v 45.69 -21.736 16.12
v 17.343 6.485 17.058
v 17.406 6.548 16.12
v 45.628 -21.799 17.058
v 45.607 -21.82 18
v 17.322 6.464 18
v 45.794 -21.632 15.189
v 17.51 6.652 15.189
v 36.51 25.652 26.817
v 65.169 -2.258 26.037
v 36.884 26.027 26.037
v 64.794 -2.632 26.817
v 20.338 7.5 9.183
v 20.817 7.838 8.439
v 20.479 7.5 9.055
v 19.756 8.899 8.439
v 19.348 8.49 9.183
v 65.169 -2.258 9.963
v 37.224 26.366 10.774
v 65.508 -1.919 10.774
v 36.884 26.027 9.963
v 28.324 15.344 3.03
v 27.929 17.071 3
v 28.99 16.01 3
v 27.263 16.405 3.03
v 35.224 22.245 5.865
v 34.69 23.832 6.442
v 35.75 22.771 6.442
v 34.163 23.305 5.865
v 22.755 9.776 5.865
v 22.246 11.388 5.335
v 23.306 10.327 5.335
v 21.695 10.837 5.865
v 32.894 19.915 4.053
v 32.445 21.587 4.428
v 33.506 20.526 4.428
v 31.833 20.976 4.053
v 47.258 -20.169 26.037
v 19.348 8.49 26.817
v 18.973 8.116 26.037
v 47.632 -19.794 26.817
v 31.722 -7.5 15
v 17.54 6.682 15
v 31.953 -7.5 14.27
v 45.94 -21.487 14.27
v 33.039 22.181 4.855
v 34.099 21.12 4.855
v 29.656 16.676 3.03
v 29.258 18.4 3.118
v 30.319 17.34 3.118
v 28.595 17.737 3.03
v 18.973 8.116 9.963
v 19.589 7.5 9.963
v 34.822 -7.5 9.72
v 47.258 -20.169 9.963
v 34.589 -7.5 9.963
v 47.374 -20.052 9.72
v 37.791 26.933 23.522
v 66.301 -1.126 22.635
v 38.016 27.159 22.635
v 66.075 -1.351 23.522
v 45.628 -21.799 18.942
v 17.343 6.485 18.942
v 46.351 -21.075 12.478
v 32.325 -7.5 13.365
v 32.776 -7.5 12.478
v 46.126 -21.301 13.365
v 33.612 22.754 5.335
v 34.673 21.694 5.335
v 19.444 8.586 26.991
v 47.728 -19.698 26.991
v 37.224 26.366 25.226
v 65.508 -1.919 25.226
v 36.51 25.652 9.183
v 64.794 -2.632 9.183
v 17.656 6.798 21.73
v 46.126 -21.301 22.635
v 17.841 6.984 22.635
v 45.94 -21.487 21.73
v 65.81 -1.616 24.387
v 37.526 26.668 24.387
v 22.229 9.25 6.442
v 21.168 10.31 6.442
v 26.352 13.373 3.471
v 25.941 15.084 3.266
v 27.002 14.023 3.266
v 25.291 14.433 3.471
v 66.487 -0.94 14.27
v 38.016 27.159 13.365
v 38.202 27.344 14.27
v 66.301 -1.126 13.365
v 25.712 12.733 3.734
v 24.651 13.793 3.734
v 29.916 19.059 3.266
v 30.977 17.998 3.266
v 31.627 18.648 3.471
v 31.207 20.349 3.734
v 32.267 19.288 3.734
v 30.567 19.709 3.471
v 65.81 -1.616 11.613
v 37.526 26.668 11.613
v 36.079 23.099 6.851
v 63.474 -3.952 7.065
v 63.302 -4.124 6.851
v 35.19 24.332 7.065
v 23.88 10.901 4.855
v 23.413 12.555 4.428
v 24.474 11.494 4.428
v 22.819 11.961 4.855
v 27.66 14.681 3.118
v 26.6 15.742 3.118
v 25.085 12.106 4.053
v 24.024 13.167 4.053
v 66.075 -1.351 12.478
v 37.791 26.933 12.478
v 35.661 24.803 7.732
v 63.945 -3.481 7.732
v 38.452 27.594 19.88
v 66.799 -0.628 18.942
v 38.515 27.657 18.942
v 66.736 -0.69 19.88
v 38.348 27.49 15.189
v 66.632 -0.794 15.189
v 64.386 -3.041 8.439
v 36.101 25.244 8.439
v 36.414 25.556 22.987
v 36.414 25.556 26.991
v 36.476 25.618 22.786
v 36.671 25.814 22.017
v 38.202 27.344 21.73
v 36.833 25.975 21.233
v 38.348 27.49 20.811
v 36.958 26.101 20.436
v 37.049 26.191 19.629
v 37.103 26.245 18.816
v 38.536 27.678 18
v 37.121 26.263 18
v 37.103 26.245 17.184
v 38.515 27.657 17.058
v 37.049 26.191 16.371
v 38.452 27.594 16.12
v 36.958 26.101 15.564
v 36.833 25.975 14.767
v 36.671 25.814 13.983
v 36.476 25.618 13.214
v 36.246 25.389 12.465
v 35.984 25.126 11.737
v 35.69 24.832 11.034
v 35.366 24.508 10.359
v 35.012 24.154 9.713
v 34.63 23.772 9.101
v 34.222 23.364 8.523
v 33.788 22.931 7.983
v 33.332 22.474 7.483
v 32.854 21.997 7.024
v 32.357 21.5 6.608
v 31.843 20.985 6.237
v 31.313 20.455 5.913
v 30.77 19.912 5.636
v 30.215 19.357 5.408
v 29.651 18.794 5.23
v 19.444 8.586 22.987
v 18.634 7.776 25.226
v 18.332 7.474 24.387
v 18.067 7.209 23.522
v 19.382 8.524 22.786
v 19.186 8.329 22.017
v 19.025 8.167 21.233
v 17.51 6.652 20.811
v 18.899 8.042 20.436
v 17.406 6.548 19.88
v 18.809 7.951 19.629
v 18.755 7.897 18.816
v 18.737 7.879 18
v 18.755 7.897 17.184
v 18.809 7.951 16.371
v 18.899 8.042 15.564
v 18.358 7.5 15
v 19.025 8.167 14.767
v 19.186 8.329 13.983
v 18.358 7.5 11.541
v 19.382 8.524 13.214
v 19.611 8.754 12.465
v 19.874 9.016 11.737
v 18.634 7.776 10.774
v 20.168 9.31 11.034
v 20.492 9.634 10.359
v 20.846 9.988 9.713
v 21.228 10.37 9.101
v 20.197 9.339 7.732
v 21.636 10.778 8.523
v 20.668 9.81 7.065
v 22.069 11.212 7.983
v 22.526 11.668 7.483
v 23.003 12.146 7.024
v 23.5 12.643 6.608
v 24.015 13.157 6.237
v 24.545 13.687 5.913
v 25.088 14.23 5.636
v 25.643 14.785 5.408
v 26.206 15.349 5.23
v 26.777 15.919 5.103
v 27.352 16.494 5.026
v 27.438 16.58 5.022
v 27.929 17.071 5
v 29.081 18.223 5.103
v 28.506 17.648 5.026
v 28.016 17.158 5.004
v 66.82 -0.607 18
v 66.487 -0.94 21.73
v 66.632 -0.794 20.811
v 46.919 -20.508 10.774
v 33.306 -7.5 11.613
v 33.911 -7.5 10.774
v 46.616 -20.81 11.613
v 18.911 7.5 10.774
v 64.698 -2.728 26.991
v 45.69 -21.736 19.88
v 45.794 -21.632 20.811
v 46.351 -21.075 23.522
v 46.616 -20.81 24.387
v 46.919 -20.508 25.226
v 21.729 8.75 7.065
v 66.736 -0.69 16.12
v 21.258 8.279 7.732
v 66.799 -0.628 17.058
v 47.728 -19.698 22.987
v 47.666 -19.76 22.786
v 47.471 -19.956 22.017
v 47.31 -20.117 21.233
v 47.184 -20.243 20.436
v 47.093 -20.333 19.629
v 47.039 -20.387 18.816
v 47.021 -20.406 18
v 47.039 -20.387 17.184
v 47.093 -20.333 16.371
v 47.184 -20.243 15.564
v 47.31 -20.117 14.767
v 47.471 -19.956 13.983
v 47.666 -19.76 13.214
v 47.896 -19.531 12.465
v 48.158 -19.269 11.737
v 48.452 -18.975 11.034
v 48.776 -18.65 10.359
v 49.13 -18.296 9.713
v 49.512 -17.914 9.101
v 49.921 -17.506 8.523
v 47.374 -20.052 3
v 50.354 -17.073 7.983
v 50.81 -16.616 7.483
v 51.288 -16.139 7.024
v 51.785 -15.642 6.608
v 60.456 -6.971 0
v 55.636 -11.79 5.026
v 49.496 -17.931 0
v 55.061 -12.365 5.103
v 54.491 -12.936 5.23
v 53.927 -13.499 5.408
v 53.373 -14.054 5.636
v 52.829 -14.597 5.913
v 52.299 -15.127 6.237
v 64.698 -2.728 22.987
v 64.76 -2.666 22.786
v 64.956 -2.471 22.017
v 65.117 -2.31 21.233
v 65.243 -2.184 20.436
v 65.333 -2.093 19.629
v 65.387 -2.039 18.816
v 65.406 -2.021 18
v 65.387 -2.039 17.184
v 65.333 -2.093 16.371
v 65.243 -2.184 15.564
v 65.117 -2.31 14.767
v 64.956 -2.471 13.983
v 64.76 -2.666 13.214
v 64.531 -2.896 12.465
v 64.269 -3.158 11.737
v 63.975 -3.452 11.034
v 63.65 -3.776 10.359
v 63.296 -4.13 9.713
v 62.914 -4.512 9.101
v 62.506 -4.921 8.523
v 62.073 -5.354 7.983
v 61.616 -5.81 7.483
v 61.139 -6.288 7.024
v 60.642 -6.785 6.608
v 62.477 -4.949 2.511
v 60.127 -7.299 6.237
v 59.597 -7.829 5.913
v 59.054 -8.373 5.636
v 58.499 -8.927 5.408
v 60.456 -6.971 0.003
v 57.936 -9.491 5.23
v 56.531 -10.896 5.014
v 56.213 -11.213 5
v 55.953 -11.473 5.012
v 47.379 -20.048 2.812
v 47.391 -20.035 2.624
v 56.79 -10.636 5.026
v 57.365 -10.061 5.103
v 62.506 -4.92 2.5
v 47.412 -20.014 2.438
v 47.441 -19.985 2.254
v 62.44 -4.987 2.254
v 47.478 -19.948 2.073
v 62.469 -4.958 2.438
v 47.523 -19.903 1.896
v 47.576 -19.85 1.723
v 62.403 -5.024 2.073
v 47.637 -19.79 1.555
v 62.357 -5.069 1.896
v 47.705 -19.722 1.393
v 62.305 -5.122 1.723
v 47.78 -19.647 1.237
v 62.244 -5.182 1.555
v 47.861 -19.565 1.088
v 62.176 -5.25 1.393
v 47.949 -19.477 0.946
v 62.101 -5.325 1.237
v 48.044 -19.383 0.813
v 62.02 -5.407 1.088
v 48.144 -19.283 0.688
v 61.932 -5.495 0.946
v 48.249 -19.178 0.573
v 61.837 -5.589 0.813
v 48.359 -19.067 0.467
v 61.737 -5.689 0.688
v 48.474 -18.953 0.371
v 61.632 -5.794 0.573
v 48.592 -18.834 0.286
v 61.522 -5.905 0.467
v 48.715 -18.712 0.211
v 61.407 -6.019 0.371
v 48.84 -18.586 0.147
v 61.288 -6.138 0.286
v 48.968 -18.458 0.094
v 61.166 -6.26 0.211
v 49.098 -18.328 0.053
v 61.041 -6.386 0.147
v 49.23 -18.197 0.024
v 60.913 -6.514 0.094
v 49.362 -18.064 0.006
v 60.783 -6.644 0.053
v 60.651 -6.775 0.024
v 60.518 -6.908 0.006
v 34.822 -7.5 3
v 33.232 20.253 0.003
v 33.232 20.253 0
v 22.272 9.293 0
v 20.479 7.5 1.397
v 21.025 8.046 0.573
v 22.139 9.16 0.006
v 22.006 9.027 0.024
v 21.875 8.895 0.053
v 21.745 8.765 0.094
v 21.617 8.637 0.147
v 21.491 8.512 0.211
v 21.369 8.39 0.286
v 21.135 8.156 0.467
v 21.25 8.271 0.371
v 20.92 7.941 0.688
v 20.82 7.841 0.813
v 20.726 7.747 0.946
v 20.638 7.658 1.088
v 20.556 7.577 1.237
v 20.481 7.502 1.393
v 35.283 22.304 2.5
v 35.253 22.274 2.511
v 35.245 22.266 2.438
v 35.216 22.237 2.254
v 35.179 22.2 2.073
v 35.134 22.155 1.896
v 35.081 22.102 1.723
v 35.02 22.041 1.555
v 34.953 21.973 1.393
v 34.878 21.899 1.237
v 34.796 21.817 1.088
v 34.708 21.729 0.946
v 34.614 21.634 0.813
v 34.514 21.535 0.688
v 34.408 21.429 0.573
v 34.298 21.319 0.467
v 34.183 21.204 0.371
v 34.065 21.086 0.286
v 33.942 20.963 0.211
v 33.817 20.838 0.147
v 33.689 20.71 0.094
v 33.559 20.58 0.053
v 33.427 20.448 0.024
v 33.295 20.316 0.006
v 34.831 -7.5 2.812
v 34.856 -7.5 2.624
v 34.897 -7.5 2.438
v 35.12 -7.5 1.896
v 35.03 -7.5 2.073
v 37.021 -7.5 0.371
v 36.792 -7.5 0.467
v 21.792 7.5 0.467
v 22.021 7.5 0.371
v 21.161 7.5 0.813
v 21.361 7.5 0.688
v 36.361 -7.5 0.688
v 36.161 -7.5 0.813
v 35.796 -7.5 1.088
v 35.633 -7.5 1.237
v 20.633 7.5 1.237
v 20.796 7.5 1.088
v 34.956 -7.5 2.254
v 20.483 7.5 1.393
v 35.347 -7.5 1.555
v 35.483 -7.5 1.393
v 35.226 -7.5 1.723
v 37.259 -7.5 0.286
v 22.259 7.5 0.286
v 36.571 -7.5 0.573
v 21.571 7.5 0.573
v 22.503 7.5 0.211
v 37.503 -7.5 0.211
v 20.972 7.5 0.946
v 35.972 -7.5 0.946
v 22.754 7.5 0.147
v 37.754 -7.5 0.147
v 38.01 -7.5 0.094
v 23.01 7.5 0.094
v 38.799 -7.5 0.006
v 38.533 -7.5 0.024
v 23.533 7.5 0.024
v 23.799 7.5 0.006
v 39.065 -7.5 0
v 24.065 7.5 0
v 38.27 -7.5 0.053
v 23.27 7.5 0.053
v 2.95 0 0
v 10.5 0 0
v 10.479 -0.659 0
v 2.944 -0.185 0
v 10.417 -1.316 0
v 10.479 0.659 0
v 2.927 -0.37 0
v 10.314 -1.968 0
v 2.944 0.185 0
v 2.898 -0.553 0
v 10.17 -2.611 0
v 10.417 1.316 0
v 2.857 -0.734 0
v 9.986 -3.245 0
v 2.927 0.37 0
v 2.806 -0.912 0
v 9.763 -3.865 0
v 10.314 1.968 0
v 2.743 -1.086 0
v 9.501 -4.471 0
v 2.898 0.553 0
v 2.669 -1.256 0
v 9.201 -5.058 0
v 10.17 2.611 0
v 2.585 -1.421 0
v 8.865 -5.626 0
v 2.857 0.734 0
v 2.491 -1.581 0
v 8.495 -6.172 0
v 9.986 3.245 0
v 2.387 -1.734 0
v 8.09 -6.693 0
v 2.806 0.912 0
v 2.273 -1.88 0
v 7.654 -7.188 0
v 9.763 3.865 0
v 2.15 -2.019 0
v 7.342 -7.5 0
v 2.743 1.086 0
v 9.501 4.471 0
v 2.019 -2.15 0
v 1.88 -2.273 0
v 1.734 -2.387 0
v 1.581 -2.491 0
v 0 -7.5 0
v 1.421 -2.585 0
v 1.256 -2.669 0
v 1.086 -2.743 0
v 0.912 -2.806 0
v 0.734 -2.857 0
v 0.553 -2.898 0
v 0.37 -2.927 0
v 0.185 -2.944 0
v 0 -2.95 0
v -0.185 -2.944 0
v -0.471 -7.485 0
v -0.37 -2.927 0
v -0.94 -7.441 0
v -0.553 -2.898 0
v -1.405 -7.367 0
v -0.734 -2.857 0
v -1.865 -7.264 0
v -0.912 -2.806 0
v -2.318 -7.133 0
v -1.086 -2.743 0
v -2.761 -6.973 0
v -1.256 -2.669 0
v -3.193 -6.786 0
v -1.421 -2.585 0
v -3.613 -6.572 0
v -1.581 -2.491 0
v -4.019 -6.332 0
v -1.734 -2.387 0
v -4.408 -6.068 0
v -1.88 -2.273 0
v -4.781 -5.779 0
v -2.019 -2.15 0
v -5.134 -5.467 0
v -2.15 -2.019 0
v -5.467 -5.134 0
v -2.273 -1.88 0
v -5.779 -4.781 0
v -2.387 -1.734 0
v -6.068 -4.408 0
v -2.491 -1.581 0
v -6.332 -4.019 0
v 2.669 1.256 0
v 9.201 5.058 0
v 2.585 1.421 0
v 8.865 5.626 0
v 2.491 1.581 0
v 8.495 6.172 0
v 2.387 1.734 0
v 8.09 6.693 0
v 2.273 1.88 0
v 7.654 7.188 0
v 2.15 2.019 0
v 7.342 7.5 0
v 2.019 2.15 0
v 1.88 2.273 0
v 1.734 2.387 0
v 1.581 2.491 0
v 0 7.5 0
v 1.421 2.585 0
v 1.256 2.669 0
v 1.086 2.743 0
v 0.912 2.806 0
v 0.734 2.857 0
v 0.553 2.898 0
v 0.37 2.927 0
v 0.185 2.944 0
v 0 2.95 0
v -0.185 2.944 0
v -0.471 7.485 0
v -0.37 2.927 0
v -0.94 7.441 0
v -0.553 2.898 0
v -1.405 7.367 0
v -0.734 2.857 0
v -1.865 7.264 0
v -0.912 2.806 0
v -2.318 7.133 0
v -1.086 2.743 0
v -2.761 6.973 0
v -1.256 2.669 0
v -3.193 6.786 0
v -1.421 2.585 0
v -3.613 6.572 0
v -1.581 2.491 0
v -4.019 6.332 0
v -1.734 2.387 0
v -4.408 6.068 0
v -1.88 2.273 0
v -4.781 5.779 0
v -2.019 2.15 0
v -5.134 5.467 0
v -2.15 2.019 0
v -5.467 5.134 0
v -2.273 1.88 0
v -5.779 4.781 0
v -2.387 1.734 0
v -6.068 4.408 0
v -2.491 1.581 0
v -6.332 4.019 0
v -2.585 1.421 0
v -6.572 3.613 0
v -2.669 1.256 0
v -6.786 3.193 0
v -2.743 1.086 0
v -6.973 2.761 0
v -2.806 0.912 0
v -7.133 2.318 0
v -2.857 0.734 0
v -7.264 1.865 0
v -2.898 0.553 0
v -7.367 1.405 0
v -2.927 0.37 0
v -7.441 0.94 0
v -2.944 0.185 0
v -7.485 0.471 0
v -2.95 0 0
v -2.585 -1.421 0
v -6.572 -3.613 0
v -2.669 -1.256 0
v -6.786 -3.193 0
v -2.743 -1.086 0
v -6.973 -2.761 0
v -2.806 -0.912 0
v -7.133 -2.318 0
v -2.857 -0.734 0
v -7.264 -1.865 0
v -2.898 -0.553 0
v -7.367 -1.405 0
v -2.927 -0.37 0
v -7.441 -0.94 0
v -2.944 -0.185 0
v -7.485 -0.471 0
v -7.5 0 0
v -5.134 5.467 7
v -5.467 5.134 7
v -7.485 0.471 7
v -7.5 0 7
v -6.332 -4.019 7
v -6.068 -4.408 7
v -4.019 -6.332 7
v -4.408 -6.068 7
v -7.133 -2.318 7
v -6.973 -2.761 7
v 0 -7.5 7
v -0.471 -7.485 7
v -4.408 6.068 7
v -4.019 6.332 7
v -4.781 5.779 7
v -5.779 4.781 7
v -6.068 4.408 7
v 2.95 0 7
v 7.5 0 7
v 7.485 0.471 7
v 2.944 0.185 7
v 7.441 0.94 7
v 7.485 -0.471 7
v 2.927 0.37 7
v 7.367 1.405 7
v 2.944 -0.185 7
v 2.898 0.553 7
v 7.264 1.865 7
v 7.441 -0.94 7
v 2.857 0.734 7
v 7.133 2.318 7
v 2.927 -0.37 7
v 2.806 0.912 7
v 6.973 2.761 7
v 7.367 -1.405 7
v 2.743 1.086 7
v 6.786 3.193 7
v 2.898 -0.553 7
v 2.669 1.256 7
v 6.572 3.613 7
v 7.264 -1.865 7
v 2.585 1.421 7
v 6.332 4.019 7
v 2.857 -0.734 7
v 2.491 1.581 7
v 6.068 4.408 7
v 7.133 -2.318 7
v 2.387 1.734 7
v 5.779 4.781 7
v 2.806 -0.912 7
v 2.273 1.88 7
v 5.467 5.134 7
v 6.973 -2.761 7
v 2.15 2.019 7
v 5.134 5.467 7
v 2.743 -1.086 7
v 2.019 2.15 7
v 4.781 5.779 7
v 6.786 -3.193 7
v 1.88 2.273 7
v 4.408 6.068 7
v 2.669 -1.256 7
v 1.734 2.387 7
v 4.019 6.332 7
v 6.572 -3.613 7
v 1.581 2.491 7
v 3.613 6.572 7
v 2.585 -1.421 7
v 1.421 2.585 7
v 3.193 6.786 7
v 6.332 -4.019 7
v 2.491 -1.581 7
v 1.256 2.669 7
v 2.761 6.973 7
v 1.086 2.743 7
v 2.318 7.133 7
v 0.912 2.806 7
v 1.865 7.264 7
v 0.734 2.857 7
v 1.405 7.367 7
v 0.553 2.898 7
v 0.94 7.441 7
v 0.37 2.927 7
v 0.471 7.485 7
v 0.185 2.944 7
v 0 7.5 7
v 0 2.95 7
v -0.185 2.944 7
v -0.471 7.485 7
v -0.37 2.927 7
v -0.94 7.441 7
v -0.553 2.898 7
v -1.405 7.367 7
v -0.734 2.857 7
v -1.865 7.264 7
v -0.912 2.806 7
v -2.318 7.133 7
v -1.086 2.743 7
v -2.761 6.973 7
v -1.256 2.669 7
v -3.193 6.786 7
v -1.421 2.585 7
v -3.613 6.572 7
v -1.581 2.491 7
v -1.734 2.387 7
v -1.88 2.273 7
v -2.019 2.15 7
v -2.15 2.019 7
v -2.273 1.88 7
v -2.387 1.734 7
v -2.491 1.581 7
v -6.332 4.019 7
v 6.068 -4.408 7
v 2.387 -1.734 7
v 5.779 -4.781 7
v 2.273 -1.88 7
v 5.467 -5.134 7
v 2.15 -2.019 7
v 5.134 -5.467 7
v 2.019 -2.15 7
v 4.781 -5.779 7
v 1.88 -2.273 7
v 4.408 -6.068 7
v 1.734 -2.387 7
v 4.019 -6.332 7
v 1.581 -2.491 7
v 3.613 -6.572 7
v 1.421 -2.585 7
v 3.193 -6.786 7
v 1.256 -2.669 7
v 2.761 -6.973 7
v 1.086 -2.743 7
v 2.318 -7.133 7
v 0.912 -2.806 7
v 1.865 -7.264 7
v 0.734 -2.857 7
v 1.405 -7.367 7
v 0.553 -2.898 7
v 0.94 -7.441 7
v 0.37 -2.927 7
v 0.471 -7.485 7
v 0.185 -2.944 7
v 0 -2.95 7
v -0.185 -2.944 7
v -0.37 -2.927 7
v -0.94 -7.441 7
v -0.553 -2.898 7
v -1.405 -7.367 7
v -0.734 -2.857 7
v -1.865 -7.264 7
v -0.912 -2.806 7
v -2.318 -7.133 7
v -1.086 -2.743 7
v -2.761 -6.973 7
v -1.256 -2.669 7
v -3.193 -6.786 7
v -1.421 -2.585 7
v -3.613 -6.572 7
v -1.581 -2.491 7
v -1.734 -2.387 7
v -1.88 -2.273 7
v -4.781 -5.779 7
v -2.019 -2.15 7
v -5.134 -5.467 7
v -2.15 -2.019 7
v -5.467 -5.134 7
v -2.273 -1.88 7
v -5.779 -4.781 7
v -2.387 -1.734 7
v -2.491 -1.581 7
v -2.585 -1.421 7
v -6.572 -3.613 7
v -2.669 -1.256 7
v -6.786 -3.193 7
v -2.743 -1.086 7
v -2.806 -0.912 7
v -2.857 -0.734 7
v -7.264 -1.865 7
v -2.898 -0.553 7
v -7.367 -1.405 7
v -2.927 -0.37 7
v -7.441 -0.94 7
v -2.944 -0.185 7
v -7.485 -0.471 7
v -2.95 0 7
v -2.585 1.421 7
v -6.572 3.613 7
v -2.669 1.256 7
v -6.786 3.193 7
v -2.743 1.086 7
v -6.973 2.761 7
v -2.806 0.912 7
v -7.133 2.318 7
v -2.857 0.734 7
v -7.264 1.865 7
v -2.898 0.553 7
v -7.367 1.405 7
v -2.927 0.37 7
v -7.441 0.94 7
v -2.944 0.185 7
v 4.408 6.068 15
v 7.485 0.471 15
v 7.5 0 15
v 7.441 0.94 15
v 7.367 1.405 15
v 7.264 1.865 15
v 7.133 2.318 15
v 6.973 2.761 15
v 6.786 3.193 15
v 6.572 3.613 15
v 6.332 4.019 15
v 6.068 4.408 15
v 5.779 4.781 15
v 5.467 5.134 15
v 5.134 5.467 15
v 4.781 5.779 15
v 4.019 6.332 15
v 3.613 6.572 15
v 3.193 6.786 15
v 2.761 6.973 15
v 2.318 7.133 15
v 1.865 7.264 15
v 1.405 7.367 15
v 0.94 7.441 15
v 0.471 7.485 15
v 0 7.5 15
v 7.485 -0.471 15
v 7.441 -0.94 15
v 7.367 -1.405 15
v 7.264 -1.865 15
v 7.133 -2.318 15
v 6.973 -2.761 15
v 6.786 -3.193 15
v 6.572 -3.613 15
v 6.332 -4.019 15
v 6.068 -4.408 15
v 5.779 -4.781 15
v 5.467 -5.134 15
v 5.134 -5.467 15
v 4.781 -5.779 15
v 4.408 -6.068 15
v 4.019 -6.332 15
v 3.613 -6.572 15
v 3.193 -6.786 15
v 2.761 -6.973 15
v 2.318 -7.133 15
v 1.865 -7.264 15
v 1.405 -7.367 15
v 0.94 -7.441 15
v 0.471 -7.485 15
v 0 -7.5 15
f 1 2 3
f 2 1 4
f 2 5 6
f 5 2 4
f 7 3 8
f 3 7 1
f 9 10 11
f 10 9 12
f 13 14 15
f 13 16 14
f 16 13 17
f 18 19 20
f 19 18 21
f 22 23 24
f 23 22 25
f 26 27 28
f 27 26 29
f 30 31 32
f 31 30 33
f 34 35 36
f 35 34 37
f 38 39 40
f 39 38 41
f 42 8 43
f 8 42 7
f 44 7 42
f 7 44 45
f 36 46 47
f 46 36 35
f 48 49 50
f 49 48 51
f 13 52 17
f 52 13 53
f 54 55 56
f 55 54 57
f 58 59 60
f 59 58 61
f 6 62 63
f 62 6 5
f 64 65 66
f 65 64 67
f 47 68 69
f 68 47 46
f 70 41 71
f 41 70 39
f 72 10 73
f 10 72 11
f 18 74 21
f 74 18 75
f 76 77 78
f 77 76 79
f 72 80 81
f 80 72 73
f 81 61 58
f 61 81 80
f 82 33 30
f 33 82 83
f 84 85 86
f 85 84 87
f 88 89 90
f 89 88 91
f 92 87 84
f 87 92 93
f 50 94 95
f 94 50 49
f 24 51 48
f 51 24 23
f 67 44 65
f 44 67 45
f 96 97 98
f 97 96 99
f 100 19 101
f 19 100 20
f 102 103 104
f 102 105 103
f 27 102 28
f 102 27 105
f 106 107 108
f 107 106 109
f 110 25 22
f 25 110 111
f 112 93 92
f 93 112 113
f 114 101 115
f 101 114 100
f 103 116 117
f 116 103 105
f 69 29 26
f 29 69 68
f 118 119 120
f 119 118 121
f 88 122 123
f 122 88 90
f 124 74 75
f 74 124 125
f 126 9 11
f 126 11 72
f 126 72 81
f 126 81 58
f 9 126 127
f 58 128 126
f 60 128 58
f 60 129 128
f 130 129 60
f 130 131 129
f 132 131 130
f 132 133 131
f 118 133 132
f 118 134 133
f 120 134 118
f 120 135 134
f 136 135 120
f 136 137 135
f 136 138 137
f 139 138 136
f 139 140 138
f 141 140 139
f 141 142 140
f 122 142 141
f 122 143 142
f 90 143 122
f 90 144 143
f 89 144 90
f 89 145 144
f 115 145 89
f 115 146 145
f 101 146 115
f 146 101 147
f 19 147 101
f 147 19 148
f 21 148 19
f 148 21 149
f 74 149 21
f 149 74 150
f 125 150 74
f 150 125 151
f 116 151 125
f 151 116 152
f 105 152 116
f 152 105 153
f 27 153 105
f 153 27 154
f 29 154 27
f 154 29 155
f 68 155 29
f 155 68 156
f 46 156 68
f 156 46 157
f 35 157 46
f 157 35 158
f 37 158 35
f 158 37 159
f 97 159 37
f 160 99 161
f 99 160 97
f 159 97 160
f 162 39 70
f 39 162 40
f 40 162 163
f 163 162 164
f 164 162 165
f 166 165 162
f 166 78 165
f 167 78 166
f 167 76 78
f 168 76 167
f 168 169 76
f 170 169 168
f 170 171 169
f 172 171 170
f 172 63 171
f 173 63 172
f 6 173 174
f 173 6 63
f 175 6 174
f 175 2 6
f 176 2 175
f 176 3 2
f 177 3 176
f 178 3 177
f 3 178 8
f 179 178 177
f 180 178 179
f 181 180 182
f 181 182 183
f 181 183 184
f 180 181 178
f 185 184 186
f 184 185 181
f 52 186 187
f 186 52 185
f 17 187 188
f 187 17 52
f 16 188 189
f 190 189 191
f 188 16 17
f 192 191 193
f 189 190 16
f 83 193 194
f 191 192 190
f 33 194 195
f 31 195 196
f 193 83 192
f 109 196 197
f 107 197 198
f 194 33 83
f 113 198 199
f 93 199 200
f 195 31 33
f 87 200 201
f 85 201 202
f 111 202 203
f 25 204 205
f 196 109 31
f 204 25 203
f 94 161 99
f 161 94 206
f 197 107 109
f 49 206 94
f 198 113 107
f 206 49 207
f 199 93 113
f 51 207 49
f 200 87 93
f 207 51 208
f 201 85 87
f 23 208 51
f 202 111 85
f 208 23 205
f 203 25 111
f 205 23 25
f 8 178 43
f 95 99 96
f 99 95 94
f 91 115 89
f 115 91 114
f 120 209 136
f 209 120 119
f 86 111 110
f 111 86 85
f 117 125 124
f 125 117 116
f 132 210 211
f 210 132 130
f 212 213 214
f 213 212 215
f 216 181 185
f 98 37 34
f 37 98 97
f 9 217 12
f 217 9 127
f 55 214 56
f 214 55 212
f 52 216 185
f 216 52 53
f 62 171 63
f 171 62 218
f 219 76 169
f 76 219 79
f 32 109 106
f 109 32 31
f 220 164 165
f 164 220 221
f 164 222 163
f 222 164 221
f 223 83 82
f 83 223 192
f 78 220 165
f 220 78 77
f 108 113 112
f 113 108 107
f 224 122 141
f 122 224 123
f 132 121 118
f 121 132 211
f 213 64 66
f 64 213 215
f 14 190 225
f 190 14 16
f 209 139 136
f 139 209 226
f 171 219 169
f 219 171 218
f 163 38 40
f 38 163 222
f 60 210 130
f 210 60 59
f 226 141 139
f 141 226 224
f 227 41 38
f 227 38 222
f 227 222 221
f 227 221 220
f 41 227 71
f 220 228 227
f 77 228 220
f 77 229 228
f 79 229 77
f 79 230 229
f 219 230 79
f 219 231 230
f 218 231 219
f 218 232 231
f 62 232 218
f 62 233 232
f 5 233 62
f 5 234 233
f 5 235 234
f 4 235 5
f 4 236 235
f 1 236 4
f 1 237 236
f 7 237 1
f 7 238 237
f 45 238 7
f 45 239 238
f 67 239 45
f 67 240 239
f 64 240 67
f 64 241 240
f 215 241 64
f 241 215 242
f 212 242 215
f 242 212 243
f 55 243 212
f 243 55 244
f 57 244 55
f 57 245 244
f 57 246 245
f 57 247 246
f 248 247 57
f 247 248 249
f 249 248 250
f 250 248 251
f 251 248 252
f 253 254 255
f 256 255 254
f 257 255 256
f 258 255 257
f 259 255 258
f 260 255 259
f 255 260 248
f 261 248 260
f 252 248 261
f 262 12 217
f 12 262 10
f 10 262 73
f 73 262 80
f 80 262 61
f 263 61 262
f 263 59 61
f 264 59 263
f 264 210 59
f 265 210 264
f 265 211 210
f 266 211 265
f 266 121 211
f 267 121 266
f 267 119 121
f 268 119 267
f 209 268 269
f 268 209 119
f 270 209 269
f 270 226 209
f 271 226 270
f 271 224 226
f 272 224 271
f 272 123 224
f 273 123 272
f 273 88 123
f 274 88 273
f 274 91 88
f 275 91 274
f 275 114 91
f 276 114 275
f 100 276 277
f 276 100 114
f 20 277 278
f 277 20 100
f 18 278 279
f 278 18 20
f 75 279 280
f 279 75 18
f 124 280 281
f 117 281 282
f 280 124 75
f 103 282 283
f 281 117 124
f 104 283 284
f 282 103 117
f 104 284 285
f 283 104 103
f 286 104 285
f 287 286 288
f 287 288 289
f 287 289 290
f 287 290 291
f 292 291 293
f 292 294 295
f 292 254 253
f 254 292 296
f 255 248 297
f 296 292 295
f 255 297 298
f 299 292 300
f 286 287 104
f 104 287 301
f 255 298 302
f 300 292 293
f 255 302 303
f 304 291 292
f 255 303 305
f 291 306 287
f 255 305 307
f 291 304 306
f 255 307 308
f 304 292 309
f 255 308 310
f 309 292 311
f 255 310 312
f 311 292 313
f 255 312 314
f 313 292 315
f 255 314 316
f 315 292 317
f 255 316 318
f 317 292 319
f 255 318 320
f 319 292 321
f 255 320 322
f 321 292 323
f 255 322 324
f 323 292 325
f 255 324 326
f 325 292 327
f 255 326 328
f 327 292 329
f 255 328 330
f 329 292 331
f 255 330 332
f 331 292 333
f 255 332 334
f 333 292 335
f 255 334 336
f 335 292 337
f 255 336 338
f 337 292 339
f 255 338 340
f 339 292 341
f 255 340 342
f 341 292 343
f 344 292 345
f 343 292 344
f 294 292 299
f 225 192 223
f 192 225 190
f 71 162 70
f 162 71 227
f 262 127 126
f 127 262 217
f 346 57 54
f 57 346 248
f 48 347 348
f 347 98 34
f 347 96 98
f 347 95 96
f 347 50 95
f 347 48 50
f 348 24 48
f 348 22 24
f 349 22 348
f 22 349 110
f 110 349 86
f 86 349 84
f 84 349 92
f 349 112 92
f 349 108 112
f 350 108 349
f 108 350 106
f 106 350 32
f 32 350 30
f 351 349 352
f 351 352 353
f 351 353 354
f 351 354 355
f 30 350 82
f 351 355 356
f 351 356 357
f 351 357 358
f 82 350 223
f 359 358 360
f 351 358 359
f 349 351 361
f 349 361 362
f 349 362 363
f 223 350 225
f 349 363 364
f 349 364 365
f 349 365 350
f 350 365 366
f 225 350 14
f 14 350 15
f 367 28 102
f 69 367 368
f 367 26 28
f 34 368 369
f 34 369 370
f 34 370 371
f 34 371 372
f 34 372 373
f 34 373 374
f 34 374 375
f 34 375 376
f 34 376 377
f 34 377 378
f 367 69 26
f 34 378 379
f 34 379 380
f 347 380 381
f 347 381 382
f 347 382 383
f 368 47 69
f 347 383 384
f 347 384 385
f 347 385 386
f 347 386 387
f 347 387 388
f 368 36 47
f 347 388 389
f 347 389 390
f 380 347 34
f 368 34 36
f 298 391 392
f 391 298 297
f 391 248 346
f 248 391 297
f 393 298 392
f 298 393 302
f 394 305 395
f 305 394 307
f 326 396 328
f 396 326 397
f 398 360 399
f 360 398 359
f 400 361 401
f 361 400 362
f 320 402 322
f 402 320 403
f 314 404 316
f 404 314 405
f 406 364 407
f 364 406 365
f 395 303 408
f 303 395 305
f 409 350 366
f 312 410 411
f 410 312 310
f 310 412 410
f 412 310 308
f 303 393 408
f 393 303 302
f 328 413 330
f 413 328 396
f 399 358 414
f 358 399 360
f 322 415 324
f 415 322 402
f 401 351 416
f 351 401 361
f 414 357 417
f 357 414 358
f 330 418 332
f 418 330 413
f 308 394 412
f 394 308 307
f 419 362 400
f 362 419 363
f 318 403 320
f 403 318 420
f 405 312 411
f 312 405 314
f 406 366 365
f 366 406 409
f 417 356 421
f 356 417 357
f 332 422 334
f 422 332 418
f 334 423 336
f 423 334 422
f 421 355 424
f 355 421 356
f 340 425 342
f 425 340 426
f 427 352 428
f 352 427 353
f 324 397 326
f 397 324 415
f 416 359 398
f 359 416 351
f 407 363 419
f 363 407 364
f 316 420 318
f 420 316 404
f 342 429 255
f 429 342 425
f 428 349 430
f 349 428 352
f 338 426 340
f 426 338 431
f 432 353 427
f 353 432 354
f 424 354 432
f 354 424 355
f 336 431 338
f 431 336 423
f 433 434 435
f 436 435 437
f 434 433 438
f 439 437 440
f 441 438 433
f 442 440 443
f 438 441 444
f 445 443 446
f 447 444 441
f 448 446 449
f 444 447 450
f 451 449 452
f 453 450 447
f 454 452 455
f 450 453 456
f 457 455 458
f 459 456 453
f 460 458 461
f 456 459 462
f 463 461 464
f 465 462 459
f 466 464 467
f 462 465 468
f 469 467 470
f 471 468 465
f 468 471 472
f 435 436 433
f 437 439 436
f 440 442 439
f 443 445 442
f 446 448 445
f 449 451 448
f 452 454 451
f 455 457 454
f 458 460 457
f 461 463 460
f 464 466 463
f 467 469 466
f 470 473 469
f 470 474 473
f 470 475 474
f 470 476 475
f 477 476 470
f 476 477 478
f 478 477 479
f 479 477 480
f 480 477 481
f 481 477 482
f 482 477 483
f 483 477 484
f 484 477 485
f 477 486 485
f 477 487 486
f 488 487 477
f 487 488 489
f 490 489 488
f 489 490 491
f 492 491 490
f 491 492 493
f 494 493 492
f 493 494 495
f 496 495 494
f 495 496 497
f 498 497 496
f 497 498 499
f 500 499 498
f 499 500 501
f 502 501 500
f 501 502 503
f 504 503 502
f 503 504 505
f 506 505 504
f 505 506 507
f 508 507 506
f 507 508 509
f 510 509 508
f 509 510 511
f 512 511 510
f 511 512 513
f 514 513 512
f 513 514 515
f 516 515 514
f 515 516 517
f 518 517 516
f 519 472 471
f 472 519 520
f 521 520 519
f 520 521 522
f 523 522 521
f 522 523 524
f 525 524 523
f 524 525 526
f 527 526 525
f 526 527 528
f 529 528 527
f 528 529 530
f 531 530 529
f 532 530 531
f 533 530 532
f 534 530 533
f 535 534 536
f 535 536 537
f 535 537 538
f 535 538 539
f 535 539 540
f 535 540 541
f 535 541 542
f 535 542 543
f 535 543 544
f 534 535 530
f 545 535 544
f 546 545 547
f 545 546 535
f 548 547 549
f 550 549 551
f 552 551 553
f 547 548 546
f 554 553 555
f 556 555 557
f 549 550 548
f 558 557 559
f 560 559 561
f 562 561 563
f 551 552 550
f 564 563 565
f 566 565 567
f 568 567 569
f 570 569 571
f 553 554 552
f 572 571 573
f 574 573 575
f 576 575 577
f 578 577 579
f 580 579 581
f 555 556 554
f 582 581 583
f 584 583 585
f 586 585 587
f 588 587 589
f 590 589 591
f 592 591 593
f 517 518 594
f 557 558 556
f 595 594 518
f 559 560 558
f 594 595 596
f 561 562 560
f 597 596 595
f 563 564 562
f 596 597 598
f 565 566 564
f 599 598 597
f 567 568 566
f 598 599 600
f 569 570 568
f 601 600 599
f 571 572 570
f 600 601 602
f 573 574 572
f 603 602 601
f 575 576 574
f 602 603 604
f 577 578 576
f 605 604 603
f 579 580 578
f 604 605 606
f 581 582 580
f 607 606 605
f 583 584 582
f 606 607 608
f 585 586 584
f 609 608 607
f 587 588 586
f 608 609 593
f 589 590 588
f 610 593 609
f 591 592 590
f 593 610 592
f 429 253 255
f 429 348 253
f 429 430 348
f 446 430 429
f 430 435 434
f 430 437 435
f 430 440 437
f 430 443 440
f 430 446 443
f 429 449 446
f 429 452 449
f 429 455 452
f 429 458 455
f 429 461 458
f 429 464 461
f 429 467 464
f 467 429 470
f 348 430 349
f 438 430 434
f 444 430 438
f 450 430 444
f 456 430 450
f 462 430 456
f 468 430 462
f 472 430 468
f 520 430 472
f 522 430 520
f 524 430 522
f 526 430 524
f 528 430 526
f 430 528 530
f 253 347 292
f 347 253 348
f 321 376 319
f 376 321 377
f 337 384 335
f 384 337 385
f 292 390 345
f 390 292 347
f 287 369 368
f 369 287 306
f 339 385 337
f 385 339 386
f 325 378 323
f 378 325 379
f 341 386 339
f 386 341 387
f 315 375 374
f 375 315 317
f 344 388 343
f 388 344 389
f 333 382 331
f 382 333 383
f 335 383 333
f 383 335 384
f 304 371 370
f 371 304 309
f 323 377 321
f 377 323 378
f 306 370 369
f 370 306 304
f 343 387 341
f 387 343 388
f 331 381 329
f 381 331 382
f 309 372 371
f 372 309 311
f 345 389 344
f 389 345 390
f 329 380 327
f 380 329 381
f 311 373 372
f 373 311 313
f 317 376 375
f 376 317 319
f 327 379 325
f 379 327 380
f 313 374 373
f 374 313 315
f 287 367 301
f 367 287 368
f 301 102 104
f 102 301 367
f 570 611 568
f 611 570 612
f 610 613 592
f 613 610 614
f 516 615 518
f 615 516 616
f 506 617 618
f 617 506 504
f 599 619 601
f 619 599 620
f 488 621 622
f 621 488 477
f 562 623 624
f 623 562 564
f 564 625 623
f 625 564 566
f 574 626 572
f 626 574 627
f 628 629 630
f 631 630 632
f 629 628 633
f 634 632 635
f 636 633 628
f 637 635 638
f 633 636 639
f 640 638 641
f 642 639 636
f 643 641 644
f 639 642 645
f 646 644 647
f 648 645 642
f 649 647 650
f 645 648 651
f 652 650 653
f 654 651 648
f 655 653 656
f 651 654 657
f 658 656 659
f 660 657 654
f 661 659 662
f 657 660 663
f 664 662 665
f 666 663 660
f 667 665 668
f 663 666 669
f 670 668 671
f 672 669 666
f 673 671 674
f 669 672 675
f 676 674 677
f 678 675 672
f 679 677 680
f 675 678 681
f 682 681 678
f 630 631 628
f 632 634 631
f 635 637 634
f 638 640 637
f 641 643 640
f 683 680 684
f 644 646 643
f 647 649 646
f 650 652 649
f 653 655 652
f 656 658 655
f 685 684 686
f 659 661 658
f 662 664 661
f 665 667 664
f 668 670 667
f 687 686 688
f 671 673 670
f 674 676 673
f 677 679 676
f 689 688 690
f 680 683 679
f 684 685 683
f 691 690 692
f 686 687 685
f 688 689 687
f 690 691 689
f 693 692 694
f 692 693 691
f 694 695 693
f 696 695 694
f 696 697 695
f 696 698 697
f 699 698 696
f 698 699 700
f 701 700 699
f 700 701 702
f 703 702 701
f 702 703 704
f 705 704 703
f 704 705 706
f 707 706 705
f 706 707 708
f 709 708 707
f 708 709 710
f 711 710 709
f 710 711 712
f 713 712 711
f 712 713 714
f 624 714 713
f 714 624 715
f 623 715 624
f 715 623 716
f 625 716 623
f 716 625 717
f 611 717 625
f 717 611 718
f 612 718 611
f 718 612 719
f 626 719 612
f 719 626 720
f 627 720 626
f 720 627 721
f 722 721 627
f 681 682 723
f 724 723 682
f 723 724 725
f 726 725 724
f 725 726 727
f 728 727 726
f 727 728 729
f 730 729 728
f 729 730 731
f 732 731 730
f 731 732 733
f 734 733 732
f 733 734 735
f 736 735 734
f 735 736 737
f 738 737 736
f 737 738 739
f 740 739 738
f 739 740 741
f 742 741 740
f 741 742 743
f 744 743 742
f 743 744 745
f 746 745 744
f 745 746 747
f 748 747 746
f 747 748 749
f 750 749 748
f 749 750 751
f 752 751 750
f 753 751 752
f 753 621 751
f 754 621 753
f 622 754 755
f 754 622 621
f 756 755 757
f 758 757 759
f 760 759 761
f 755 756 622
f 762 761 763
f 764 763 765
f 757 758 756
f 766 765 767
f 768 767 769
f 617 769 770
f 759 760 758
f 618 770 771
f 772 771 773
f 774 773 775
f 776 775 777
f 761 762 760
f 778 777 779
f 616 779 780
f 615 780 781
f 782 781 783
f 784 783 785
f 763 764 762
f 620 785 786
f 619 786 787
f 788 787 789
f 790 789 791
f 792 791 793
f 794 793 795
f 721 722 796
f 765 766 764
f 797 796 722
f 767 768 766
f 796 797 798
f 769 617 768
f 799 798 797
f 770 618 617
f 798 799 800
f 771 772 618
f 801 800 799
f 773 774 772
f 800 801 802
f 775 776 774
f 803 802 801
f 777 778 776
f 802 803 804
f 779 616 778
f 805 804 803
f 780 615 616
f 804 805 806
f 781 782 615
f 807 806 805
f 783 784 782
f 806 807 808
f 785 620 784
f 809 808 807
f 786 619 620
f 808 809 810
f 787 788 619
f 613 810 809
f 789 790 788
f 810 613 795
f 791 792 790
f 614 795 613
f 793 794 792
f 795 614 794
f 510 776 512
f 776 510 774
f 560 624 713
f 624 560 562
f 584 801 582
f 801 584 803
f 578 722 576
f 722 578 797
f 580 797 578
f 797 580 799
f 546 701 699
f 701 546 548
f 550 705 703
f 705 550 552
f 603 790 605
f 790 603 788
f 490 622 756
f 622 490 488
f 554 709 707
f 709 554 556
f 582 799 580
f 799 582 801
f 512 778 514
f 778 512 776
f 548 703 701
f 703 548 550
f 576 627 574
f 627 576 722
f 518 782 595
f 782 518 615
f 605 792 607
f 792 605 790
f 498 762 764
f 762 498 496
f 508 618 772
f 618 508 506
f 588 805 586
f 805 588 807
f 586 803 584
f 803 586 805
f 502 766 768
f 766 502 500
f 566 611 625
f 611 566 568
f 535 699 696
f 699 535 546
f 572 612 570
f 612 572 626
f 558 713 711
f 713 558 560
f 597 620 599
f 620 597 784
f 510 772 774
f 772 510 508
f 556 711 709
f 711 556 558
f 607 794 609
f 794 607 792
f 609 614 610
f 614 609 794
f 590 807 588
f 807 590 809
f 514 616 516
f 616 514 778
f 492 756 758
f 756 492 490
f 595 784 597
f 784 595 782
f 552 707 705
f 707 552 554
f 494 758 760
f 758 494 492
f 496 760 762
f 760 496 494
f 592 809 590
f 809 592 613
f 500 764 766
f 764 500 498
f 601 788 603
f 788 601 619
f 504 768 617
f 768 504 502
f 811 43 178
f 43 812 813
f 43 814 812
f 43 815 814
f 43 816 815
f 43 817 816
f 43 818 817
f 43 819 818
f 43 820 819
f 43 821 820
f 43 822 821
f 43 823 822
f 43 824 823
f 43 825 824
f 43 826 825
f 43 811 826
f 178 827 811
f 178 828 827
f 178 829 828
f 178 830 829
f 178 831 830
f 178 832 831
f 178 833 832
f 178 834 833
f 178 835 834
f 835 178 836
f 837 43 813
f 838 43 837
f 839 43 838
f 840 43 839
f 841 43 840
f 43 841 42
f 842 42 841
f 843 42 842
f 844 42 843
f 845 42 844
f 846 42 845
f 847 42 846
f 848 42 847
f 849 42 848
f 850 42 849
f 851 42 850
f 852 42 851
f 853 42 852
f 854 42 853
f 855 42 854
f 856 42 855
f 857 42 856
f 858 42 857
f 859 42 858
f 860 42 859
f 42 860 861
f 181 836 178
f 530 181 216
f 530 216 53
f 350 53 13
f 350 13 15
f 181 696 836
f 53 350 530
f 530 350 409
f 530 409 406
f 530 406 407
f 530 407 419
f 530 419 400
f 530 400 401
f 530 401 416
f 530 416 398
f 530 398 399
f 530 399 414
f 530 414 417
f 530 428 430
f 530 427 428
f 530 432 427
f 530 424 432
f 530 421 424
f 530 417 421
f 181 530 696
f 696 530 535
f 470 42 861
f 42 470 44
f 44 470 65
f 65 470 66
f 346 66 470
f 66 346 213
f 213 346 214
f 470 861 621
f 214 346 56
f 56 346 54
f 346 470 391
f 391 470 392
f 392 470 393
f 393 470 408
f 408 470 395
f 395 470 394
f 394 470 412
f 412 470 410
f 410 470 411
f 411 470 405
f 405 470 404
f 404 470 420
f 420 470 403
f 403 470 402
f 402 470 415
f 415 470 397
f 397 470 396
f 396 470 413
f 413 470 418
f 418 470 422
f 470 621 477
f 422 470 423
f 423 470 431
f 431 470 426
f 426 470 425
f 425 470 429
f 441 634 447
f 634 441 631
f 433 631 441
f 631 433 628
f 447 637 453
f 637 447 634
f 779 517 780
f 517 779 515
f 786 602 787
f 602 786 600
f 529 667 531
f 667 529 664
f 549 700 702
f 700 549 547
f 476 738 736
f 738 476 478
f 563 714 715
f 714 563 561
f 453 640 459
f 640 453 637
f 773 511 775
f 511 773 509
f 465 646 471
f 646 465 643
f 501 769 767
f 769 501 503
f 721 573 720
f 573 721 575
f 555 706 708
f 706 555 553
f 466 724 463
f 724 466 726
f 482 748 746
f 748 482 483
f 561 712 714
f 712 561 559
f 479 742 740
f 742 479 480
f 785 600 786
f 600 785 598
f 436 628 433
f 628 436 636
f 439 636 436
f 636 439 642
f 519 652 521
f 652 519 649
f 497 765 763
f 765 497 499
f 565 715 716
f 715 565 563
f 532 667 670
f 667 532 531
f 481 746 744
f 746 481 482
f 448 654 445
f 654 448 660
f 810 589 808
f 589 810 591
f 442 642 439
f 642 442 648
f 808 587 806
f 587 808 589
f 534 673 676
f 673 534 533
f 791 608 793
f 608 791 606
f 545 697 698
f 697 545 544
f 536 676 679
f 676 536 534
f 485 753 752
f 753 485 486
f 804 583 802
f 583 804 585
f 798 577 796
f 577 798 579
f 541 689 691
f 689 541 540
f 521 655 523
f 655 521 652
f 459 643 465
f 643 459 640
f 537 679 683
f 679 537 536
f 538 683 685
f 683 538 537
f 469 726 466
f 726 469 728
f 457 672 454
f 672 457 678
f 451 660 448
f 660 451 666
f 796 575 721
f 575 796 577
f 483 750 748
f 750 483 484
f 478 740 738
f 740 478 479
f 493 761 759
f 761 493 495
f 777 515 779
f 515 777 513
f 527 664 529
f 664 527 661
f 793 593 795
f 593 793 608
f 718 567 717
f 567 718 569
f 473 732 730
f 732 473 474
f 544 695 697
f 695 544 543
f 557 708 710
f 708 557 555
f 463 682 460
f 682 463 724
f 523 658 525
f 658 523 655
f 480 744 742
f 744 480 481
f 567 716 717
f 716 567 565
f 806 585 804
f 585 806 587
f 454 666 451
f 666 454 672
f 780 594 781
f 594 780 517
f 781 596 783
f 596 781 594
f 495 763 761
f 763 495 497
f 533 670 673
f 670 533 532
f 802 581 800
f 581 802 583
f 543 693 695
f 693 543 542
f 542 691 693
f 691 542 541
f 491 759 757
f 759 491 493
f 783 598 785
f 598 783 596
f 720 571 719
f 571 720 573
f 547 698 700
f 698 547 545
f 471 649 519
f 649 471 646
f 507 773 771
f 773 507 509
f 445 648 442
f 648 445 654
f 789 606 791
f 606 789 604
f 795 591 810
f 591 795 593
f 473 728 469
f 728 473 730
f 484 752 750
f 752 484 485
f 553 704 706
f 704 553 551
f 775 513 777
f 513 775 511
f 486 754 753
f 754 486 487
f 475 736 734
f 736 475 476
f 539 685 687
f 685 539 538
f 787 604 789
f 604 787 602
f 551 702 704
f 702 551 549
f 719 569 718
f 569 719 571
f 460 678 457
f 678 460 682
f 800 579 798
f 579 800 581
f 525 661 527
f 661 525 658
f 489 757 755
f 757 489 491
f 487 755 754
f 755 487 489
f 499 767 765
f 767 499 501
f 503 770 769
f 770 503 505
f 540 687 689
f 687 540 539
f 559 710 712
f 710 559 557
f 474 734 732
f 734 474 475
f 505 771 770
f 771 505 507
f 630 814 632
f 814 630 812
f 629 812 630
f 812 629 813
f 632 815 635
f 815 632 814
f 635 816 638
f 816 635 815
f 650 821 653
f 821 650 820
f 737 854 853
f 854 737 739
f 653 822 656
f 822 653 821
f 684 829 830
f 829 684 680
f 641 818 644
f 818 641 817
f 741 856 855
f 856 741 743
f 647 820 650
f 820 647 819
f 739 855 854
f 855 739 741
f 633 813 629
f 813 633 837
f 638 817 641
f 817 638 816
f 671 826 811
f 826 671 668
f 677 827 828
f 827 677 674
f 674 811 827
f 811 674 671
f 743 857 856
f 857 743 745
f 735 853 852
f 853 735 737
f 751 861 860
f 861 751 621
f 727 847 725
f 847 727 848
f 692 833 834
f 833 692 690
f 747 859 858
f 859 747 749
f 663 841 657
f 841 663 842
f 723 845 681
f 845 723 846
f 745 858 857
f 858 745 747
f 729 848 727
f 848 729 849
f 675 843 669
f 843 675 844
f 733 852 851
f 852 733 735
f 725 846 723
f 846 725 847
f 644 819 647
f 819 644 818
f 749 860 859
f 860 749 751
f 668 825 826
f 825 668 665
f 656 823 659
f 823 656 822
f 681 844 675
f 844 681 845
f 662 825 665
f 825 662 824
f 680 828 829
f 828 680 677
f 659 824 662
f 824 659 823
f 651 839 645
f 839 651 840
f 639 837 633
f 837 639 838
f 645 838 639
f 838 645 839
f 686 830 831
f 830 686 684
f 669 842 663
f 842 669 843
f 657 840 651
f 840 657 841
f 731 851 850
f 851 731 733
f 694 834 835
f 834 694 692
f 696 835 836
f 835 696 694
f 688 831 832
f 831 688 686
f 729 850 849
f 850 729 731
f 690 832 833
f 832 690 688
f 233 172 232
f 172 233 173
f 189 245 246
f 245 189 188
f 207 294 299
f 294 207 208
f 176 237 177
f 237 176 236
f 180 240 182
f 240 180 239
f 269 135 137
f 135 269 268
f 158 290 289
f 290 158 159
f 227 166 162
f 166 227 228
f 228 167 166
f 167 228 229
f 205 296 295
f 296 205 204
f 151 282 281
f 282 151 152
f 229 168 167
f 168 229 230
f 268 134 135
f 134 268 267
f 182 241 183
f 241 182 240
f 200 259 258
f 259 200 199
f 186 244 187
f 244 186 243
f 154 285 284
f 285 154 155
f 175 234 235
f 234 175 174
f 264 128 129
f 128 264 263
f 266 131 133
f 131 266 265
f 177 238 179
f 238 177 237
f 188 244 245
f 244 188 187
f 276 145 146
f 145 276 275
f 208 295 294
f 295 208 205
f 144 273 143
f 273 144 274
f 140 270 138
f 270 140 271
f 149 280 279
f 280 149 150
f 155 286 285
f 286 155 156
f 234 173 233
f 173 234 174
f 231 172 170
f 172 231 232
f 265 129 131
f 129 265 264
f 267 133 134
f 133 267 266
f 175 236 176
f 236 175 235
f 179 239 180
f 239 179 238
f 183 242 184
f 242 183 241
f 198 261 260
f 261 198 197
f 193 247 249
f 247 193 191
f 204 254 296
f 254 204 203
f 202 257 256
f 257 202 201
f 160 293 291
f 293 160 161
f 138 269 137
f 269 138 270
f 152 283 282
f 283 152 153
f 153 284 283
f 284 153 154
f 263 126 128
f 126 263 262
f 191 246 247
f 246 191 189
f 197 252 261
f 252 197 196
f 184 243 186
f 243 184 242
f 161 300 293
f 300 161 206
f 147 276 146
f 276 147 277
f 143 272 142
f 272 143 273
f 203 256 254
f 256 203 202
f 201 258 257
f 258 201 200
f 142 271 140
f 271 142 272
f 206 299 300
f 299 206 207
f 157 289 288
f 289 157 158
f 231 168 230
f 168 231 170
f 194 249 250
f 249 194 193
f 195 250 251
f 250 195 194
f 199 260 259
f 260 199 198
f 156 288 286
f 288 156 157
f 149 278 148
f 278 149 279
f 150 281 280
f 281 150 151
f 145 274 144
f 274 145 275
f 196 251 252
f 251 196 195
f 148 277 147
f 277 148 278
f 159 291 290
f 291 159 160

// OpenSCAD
$fn=100;

module barre() {
    translate([0,0,-3.5])cylinder(d=21,h=3.5);
    translate([0,0,0])   cylinder(d=5.90,h=8);
    translate([0,0,7])   cylinder(d=15,h=50);

    difference() {
        cylinder(d=21,h=4);
        translate([-20,-8.6,0])cube([40,20,4]);
    }
}

module pomme() {
translate([0,-25,0])rotate([-90,0,0])cylinder(d=26,h=100);
}
module pla() {
    cylinder(d=15, h=7);
    translate([0,-15/2,0]) cube([40,15,15]);
    translate([35,10,0]) rotate([0,0,180+45])support_pomme();
/*translate([0,17/2,0])difference(){
cube([30,21.5,9]);
rotate([0,0,45])cube([40,30,9]);
}*/
}

module support_pomme() {
translate([2.5,-8.5,3]) cube([10,38.5,15]);
translate([9.5,-8.5,3])rotate([-90,0,0])cylinder(d=6,h=38.5);
translate([-6,-8.5,0]) cube([15.5,38.5,13]);
translate([-5.9,-8.5,3])rotate([-90,0,0])cylinder(d=6,h=38.5);
translate([-8.9,-8.5,2.5])rotate([0,-14.5,0])#cube([5,38.5,12.8]);
difference() {
translate([0,-10,18])rotate([-90,0,0])cylinder(d=30,h=40);
translate([0,10,28])#cube([24,45,20], center=true);
}
}


module main() {
difference() {
pla();
{
	barre();
	translate([35,10,18]) rotate([0,0,180+45])#pomme();
}
}
}

main();
